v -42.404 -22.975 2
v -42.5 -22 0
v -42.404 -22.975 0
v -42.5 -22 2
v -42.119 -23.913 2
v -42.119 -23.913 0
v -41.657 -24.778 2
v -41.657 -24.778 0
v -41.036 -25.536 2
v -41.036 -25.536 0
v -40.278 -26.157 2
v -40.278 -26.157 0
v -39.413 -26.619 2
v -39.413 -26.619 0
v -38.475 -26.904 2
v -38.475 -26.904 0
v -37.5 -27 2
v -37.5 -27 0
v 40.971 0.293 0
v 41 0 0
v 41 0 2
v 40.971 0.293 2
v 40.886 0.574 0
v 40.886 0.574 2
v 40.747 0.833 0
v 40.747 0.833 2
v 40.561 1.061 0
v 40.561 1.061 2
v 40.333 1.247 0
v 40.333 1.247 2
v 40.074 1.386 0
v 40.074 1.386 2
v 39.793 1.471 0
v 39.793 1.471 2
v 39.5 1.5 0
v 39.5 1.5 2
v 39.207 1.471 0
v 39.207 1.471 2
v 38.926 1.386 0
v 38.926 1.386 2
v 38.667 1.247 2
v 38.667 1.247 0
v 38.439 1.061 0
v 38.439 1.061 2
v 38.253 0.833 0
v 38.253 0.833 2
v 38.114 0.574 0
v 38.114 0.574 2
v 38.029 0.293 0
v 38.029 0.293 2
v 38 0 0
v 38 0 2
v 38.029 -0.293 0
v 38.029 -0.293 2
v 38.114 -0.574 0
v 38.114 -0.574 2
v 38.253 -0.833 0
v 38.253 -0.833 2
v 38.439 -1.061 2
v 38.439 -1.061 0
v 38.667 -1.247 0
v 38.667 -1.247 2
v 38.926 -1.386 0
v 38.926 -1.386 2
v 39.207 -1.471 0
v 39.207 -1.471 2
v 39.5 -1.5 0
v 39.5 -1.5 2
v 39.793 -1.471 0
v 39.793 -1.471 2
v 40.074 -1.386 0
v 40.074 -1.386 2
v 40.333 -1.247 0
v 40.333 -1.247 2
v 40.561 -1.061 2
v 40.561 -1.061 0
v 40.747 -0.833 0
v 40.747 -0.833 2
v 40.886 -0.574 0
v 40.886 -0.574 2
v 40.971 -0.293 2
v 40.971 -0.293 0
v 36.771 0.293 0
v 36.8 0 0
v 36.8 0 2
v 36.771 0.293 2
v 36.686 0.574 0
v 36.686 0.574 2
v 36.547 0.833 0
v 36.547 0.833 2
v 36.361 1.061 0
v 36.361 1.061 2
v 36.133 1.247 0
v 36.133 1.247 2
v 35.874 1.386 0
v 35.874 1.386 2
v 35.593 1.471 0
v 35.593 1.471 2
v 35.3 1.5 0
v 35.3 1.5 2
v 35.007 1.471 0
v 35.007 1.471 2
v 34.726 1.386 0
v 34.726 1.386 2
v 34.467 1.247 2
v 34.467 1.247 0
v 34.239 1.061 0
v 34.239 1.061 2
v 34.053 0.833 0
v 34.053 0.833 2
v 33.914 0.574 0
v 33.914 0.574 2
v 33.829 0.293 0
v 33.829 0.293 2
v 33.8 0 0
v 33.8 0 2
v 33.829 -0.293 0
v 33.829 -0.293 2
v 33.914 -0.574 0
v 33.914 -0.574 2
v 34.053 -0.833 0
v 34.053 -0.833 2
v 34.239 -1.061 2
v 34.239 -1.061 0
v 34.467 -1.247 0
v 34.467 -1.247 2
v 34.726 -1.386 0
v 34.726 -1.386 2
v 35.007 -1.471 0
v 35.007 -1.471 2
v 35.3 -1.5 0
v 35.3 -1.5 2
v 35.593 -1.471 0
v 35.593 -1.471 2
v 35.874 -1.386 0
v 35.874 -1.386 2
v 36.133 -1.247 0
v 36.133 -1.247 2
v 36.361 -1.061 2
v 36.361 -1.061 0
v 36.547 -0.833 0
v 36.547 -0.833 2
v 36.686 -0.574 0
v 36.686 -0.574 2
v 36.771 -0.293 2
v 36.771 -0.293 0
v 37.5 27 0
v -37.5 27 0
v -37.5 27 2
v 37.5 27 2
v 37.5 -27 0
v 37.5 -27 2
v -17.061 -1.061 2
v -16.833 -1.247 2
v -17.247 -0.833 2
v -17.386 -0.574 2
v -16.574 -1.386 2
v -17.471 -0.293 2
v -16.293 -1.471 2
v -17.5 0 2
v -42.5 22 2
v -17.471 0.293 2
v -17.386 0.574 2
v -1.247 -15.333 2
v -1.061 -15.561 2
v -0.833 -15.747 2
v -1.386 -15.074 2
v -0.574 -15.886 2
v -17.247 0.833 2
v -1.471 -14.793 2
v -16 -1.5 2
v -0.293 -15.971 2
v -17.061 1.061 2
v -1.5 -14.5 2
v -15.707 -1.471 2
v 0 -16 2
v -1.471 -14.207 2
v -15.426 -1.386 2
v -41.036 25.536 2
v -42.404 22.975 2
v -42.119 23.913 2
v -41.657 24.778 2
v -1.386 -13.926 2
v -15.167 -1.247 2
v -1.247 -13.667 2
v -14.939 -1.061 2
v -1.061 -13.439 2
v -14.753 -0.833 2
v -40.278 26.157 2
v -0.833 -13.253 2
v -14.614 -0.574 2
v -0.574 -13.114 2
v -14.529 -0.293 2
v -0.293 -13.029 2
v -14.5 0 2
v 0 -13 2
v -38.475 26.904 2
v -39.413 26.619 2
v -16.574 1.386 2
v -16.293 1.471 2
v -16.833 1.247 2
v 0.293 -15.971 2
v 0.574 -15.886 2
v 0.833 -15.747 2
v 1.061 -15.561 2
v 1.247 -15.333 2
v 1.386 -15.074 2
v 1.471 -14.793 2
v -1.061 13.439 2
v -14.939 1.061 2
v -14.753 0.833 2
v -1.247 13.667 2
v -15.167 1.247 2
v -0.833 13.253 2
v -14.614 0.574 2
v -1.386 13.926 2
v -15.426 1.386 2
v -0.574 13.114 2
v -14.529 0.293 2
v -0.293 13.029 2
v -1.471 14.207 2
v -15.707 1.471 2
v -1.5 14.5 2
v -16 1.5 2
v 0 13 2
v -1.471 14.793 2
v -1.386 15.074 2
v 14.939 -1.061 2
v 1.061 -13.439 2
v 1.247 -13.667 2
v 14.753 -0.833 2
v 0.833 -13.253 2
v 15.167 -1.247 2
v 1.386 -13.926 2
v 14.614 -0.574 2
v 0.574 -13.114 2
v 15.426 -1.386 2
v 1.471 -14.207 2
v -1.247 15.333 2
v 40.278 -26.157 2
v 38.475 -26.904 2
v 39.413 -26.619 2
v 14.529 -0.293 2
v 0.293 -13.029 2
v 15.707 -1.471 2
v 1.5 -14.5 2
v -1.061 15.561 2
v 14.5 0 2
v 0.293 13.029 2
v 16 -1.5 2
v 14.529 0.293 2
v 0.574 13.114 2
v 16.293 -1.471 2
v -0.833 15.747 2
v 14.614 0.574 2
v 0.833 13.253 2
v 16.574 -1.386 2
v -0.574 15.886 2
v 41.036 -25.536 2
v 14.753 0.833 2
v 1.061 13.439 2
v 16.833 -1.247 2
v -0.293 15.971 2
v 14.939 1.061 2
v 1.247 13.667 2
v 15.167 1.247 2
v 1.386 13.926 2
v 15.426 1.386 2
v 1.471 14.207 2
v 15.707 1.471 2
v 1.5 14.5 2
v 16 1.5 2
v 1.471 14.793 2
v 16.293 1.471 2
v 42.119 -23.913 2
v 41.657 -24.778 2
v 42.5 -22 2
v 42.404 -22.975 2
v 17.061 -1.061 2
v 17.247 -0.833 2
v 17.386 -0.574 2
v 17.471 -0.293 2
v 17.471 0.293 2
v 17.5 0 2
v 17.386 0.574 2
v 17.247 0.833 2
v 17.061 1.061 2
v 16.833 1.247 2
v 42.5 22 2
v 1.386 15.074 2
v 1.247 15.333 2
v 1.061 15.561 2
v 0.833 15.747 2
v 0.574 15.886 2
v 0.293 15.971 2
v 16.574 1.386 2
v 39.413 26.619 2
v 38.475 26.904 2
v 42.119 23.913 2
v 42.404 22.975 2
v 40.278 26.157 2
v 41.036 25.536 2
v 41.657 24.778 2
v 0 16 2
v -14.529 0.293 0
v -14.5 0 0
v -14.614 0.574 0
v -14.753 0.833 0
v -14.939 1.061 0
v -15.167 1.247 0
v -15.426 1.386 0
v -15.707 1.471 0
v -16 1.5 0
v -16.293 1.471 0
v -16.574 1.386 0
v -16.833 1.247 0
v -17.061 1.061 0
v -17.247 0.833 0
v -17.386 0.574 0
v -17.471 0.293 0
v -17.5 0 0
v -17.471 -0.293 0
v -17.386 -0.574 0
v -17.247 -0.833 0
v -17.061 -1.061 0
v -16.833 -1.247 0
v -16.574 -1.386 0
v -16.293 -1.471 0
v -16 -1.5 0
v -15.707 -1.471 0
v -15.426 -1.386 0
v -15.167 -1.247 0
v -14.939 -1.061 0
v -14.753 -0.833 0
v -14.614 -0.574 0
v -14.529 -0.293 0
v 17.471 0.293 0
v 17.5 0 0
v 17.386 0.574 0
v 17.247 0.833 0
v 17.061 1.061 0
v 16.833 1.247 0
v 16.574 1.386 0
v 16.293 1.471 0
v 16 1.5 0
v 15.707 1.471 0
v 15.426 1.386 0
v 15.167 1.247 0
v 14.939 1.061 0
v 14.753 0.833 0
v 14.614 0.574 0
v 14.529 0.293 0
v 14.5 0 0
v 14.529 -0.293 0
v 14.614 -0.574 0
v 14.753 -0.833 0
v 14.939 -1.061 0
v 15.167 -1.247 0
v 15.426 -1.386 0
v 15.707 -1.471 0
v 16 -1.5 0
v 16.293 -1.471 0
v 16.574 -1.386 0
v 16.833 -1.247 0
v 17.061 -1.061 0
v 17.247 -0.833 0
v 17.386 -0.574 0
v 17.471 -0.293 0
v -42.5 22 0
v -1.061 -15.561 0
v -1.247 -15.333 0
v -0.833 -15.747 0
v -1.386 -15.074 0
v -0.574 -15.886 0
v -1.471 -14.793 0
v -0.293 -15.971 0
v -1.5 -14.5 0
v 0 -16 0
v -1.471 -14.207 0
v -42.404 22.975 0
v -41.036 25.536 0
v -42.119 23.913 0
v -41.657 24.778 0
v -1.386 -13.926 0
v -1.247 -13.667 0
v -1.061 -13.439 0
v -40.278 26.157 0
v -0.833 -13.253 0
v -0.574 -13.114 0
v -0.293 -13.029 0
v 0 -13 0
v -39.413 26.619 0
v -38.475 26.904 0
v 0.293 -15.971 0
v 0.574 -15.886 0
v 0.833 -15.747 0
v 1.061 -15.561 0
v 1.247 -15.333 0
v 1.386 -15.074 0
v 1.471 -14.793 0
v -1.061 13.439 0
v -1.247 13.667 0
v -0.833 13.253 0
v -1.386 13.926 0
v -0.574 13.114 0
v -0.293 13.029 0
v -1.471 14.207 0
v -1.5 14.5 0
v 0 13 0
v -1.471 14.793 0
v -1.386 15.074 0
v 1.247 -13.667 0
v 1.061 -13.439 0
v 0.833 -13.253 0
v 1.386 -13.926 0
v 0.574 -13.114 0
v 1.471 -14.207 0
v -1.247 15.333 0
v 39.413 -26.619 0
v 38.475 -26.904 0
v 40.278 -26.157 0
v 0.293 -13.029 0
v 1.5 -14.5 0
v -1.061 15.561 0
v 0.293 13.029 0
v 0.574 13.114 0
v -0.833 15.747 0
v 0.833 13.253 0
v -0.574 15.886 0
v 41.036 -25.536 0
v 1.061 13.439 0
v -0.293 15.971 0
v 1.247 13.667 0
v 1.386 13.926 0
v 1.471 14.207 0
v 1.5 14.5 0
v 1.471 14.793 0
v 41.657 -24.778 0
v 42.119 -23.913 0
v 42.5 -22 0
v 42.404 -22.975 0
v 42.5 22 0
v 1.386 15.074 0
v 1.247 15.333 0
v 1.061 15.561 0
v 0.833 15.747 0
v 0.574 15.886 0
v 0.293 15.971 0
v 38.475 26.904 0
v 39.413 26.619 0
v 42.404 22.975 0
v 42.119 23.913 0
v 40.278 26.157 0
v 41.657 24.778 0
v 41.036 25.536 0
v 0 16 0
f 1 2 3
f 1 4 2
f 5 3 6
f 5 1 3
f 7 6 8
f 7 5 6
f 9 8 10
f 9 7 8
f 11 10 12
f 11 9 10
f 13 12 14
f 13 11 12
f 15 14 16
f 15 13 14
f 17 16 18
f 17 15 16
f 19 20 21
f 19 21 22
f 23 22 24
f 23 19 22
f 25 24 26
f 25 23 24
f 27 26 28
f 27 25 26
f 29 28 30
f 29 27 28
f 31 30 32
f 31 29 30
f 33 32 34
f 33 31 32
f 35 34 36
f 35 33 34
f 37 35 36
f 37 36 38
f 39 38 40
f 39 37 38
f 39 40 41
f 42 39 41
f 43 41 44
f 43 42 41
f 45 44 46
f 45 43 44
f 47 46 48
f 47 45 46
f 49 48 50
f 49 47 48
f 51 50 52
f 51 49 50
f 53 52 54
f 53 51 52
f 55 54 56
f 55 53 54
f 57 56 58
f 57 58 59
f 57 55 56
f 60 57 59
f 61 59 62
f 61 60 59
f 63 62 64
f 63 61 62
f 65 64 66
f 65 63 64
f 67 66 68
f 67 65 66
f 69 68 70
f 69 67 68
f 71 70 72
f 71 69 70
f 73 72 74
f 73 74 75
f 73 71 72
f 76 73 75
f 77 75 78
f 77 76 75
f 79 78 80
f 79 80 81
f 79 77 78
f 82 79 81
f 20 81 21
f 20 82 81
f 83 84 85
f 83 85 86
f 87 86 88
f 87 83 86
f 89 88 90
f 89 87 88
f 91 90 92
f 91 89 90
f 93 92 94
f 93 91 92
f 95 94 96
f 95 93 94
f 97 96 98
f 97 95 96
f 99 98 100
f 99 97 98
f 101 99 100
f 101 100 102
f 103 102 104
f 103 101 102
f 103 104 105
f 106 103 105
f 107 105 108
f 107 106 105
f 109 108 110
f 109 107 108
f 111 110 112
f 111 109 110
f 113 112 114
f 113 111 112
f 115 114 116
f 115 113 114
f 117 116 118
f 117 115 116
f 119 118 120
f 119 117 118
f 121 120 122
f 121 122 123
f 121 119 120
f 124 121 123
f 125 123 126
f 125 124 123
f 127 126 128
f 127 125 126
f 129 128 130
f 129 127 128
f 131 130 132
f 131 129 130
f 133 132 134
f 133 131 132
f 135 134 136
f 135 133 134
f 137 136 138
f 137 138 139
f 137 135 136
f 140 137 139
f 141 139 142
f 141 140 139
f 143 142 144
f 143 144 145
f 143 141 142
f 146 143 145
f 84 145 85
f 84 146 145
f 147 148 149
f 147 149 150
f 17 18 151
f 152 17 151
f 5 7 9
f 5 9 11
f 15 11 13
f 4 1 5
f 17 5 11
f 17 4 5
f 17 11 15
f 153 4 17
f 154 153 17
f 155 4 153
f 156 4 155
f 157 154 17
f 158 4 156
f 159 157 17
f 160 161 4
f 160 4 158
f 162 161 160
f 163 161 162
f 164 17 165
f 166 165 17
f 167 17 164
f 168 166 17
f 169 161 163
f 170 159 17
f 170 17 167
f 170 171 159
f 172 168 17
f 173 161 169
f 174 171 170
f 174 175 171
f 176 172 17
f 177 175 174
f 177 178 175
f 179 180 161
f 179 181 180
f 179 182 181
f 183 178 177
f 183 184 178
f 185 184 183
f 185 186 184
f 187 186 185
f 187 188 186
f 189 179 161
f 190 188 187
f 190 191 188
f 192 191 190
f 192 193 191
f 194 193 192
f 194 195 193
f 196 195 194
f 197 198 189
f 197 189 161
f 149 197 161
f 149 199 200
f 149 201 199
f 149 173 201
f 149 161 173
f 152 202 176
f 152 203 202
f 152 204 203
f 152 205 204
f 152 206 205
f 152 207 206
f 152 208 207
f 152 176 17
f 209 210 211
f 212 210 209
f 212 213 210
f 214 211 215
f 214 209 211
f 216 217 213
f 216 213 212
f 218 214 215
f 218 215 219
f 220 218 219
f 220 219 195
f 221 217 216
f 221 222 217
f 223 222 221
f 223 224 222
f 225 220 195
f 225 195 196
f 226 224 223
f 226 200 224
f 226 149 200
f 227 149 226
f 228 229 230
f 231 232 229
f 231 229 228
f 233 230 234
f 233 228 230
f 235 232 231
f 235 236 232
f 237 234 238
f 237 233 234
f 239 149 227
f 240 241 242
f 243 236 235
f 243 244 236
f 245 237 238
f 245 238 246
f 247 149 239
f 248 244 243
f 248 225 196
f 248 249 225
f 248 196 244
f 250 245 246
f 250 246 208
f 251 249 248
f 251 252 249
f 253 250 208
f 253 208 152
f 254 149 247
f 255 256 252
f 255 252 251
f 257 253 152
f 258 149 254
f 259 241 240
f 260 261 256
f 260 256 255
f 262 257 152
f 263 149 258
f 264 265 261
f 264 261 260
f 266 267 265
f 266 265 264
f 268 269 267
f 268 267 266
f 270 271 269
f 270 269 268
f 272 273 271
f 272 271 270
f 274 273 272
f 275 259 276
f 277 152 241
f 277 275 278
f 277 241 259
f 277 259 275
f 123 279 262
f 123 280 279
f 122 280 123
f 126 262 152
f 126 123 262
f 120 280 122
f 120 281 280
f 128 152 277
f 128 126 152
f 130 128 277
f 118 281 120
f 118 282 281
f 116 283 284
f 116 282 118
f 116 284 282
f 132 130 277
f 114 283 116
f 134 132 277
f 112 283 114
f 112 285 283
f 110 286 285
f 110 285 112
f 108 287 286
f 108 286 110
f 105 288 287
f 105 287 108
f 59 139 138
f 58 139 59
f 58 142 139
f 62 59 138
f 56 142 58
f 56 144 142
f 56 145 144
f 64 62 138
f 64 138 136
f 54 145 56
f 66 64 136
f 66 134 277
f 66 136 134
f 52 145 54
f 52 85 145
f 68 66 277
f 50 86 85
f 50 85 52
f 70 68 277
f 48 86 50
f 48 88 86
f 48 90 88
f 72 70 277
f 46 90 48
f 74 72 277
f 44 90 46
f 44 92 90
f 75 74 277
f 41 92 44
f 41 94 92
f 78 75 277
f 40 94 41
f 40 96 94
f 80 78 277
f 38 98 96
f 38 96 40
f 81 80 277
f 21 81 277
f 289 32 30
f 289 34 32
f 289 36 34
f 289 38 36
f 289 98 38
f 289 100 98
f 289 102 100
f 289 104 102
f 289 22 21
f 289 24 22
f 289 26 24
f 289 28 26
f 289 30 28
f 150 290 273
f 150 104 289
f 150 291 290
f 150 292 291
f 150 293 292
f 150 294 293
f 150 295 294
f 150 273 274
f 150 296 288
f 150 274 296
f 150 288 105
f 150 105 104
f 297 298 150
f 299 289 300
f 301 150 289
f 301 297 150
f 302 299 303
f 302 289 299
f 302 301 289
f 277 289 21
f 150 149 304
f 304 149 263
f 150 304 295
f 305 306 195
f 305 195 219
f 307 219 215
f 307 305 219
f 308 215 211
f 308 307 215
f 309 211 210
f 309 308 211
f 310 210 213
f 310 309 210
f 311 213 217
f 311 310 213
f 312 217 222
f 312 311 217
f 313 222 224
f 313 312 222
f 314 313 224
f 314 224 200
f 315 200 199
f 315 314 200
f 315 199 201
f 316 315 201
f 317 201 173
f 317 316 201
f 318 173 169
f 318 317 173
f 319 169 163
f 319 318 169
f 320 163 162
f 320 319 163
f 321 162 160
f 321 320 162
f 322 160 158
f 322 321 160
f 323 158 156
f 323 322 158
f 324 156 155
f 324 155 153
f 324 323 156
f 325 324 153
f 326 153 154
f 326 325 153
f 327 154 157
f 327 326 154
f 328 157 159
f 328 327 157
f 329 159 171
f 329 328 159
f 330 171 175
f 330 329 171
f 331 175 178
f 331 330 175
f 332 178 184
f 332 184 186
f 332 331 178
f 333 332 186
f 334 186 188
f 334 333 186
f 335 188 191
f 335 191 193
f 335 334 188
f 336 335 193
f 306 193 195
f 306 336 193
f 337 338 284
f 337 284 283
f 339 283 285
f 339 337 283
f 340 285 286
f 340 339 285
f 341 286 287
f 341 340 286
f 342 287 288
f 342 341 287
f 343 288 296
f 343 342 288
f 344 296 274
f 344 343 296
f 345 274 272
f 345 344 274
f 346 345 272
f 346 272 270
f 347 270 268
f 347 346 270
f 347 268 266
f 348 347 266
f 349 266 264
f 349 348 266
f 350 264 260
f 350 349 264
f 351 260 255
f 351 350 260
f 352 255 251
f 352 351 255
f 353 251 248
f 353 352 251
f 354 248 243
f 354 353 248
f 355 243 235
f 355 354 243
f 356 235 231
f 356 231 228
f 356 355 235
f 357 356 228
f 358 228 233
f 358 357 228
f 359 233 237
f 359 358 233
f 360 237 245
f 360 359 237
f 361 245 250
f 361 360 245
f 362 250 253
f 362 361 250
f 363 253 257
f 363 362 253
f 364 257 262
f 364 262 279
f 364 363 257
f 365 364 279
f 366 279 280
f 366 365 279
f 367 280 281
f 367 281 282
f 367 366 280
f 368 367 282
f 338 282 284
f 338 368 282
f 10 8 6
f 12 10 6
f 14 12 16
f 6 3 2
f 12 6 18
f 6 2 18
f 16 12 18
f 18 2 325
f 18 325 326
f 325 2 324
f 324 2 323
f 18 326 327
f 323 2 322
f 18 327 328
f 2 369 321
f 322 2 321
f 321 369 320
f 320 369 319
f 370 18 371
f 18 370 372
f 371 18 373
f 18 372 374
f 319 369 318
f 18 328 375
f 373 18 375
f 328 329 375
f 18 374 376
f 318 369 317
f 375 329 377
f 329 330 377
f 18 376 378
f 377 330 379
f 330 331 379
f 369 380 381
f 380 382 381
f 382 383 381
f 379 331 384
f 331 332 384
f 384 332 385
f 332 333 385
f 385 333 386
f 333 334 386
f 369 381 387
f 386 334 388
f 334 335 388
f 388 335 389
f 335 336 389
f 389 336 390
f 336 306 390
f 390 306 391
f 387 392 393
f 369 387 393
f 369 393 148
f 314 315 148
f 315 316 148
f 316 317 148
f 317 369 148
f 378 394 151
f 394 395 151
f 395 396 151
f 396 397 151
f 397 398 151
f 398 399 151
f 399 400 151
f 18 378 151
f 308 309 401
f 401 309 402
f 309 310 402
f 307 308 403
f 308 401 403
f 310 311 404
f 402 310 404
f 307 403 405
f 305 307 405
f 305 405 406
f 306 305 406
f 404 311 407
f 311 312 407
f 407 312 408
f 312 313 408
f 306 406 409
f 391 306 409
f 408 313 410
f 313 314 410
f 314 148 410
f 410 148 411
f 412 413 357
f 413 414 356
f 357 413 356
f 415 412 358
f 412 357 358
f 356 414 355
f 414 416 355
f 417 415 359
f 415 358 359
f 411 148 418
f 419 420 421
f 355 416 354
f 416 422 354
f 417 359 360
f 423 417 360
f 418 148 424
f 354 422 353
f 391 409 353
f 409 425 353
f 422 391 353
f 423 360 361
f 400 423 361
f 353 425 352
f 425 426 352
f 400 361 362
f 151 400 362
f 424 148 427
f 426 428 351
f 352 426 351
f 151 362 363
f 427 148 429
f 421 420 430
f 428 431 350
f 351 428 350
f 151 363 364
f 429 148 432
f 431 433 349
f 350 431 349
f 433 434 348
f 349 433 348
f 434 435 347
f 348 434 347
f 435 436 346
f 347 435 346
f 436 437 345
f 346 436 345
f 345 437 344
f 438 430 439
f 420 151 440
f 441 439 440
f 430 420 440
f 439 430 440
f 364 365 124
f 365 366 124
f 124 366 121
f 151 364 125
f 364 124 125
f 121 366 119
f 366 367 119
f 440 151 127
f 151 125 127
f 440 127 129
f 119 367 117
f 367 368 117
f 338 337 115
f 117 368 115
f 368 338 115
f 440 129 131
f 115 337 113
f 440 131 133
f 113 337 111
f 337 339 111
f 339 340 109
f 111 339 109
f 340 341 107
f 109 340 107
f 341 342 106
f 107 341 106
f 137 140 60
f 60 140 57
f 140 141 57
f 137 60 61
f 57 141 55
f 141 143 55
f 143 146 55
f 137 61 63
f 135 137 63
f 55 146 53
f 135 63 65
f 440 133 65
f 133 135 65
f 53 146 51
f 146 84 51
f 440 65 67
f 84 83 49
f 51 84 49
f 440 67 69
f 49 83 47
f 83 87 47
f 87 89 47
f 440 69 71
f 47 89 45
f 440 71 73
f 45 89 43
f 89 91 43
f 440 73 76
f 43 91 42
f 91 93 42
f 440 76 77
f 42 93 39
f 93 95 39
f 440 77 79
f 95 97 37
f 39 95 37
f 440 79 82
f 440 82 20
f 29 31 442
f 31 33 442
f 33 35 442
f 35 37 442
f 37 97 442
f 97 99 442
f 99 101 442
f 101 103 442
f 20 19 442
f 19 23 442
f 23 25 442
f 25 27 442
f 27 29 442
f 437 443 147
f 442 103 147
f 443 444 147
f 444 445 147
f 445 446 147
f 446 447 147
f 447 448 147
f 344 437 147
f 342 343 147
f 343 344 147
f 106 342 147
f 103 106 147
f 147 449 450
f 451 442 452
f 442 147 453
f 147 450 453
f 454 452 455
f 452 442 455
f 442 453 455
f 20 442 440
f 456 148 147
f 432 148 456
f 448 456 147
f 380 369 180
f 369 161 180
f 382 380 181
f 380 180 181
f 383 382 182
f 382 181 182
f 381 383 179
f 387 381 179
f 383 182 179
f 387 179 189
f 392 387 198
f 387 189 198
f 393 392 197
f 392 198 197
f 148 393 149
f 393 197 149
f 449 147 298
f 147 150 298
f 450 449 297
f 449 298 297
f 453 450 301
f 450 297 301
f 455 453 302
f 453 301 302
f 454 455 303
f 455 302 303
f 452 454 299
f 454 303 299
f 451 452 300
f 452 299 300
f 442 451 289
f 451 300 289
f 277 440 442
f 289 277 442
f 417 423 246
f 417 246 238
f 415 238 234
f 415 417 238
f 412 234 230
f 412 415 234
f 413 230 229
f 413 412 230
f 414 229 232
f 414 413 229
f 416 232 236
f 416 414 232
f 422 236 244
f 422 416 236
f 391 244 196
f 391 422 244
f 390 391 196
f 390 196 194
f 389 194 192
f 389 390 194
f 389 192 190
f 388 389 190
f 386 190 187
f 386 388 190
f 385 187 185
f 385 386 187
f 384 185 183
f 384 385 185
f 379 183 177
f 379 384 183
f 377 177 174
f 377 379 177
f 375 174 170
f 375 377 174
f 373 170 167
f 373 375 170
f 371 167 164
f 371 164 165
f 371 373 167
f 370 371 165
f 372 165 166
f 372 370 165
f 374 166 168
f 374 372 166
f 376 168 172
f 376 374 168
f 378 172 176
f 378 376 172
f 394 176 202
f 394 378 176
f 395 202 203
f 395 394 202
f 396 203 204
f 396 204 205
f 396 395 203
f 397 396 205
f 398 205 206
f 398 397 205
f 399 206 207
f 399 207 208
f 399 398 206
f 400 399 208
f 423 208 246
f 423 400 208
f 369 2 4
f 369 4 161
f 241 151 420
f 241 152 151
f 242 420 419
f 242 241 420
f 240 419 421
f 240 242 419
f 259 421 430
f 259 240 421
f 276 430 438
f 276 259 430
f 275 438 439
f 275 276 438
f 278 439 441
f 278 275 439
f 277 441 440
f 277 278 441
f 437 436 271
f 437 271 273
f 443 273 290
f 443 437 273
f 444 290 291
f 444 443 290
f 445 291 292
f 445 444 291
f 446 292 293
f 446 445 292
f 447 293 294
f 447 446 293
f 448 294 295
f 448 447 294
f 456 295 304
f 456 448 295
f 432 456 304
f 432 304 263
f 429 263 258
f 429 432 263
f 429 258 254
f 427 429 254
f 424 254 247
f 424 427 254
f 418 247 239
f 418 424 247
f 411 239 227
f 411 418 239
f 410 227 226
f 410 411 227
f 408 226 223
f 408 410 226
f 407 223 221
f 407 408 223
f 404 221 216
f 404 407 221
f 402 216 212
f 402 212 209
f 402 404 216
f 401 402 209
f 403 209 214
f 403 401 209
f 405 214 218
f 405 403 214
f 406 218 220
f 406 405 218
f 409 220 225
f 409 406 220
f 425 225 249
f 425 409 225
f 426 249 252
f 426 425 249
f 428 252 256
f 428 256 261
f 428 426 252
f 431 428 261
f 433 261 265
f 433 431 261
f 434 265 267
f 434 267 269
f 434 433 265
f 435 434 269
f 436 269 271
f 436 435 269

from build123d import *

# Parameters (mm, degrees)
SKETCH_1_W      = 85
SKETCH_1_H      = 54
SKETCH_1_R      = 1.5
EXTRUDE_1_DEPTH = 2
FILLET_1_R      = 5


with BuildPart() as part:
    # 草图1 → 凸台-拉伸1 (new body)
    with BuildSketch(Plane.XY):
        Rectangle(SKETCH_1_W, SKETCH_1_H)
        with Locations((39.5, 0)):
            Circle(SKETCH_1_R, mode=Mode.SUBTRACT)
        with Locations((35.3, 0)):
            Circle(SKETCH_1_R, mode=Mode.SUBTRACT)
        with Locations((0, 14.5)):
            Circle(SKETCH_1_R, mode=Mode.SUBTRACT)
        with Locations((-16, 0)):
            Circle(SKETCH_1_R, mode=Mode.SUBTRACT)
        with Locations((16, 0)):
            Circle(SKETCH_1_R, mode=Mode.SUBTRACT)
        with Locations((0, -14.5)):
            Circle(SKETCH_1_R, mode=Mode.SUBTRACT)
    extrude(amount=EXTRUDE_1_DEPTH)

    # 圆角1
    fillet_1_edges = [part.edges().sort_by_distance(p)[0] for p in [
        (42.5, -27, 1),
        (-42.5, -27, 1),
        (-42.5, 27, 1),
        (42.5, 27, 1),
    ]]
    fillet(fillet_1_edges, radius=FILLET_1_R)


solid = part.part
